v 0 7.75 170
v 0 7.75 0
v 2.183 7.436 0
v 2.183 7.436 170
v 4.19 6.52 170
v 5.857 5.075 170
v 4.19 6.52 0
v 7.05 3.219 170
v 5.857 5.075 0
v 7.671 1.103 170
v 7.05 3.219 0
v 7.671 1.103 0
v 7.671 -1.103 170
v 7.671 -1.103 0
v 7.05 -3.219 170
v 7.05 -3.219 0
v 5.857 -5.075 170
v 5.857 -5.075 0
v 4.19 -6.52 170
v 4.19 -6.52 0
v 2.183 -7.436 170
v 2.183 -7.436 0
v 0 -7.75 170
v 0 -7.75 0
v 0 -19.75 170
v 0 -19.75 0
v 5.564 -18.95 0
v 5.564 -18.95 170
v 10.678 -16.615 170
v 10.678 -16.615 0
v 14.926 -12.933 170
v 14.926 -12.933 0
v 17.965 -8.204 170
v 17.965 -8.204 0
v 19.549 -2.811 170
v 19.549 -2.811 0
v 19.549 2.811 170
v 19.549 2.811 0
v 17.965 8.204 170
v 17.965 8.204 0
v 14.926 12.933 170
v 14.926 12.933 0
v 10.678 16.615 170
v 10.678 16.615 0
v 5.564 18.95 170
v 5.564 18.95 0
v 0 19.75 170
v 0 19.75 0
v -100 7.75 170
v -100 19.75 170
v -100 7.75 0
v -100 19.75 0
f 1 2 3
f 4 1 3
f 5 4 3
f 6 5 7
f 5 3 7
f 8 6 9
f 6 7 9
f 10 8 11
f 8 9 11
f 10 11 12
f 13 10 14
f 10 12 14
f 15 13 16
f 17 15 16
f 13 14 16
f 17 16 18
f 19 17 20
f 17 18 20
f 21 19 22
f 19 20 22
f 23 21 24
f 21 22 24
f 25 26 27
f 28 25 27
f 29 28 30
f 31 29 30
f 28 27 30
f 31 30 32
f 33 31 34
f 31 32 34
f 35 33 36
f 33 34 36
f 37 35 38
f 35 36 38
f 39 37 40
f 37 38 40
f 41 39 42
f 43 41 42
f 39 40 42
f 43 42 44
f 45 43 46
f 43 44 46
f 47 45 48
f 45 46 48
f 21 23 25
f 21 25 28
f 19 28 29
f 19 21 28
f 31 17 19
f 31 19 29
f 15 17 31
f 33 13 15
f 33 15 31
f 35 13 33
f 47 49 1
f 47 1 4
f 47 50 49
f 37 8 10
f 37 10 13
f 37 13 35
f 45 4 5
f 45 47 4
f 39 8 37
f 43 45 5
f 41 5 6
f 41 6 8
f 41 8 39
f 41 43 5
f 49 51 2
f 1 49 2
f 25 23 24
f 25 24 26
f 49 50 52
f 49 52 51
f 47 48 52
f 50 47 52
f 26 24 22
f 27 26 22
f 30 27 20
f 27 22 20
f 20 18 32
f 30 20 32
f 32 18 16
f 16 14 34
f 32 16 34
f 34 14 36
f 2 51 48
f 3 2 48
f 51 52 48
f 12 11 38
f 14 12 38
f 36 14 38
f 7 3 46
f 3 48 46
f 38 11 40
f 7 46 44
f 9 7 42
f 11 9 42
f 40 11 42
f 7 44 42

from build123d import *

# Parameters (mm, degrees)
EXTRUDE_THIN1_DEPTH = 170


with BuildPart() as part:
    # Sketch1 → Extrude-Thin1 (new body)
    with BuildSketch(Plane.XY):
        with BuildLine():
            Line((-100, 7.75), (0, 7.75))
            ThreePointArc((0, 7.75), (7.75, 0), (0, -7.75))
            Line((0, -7.75), (0, -19.75))
            ThreePointArc((0, -19.75), (19.75, 0), (0, 19.75))
            Line((0, 19.75), (-100, 19.75))
            Line((-100, 19.75), (-100, 7.75))
        make_face()
    extrude(amount=EXTRUDE_THIN1_DEPTH)


solid = part.part
